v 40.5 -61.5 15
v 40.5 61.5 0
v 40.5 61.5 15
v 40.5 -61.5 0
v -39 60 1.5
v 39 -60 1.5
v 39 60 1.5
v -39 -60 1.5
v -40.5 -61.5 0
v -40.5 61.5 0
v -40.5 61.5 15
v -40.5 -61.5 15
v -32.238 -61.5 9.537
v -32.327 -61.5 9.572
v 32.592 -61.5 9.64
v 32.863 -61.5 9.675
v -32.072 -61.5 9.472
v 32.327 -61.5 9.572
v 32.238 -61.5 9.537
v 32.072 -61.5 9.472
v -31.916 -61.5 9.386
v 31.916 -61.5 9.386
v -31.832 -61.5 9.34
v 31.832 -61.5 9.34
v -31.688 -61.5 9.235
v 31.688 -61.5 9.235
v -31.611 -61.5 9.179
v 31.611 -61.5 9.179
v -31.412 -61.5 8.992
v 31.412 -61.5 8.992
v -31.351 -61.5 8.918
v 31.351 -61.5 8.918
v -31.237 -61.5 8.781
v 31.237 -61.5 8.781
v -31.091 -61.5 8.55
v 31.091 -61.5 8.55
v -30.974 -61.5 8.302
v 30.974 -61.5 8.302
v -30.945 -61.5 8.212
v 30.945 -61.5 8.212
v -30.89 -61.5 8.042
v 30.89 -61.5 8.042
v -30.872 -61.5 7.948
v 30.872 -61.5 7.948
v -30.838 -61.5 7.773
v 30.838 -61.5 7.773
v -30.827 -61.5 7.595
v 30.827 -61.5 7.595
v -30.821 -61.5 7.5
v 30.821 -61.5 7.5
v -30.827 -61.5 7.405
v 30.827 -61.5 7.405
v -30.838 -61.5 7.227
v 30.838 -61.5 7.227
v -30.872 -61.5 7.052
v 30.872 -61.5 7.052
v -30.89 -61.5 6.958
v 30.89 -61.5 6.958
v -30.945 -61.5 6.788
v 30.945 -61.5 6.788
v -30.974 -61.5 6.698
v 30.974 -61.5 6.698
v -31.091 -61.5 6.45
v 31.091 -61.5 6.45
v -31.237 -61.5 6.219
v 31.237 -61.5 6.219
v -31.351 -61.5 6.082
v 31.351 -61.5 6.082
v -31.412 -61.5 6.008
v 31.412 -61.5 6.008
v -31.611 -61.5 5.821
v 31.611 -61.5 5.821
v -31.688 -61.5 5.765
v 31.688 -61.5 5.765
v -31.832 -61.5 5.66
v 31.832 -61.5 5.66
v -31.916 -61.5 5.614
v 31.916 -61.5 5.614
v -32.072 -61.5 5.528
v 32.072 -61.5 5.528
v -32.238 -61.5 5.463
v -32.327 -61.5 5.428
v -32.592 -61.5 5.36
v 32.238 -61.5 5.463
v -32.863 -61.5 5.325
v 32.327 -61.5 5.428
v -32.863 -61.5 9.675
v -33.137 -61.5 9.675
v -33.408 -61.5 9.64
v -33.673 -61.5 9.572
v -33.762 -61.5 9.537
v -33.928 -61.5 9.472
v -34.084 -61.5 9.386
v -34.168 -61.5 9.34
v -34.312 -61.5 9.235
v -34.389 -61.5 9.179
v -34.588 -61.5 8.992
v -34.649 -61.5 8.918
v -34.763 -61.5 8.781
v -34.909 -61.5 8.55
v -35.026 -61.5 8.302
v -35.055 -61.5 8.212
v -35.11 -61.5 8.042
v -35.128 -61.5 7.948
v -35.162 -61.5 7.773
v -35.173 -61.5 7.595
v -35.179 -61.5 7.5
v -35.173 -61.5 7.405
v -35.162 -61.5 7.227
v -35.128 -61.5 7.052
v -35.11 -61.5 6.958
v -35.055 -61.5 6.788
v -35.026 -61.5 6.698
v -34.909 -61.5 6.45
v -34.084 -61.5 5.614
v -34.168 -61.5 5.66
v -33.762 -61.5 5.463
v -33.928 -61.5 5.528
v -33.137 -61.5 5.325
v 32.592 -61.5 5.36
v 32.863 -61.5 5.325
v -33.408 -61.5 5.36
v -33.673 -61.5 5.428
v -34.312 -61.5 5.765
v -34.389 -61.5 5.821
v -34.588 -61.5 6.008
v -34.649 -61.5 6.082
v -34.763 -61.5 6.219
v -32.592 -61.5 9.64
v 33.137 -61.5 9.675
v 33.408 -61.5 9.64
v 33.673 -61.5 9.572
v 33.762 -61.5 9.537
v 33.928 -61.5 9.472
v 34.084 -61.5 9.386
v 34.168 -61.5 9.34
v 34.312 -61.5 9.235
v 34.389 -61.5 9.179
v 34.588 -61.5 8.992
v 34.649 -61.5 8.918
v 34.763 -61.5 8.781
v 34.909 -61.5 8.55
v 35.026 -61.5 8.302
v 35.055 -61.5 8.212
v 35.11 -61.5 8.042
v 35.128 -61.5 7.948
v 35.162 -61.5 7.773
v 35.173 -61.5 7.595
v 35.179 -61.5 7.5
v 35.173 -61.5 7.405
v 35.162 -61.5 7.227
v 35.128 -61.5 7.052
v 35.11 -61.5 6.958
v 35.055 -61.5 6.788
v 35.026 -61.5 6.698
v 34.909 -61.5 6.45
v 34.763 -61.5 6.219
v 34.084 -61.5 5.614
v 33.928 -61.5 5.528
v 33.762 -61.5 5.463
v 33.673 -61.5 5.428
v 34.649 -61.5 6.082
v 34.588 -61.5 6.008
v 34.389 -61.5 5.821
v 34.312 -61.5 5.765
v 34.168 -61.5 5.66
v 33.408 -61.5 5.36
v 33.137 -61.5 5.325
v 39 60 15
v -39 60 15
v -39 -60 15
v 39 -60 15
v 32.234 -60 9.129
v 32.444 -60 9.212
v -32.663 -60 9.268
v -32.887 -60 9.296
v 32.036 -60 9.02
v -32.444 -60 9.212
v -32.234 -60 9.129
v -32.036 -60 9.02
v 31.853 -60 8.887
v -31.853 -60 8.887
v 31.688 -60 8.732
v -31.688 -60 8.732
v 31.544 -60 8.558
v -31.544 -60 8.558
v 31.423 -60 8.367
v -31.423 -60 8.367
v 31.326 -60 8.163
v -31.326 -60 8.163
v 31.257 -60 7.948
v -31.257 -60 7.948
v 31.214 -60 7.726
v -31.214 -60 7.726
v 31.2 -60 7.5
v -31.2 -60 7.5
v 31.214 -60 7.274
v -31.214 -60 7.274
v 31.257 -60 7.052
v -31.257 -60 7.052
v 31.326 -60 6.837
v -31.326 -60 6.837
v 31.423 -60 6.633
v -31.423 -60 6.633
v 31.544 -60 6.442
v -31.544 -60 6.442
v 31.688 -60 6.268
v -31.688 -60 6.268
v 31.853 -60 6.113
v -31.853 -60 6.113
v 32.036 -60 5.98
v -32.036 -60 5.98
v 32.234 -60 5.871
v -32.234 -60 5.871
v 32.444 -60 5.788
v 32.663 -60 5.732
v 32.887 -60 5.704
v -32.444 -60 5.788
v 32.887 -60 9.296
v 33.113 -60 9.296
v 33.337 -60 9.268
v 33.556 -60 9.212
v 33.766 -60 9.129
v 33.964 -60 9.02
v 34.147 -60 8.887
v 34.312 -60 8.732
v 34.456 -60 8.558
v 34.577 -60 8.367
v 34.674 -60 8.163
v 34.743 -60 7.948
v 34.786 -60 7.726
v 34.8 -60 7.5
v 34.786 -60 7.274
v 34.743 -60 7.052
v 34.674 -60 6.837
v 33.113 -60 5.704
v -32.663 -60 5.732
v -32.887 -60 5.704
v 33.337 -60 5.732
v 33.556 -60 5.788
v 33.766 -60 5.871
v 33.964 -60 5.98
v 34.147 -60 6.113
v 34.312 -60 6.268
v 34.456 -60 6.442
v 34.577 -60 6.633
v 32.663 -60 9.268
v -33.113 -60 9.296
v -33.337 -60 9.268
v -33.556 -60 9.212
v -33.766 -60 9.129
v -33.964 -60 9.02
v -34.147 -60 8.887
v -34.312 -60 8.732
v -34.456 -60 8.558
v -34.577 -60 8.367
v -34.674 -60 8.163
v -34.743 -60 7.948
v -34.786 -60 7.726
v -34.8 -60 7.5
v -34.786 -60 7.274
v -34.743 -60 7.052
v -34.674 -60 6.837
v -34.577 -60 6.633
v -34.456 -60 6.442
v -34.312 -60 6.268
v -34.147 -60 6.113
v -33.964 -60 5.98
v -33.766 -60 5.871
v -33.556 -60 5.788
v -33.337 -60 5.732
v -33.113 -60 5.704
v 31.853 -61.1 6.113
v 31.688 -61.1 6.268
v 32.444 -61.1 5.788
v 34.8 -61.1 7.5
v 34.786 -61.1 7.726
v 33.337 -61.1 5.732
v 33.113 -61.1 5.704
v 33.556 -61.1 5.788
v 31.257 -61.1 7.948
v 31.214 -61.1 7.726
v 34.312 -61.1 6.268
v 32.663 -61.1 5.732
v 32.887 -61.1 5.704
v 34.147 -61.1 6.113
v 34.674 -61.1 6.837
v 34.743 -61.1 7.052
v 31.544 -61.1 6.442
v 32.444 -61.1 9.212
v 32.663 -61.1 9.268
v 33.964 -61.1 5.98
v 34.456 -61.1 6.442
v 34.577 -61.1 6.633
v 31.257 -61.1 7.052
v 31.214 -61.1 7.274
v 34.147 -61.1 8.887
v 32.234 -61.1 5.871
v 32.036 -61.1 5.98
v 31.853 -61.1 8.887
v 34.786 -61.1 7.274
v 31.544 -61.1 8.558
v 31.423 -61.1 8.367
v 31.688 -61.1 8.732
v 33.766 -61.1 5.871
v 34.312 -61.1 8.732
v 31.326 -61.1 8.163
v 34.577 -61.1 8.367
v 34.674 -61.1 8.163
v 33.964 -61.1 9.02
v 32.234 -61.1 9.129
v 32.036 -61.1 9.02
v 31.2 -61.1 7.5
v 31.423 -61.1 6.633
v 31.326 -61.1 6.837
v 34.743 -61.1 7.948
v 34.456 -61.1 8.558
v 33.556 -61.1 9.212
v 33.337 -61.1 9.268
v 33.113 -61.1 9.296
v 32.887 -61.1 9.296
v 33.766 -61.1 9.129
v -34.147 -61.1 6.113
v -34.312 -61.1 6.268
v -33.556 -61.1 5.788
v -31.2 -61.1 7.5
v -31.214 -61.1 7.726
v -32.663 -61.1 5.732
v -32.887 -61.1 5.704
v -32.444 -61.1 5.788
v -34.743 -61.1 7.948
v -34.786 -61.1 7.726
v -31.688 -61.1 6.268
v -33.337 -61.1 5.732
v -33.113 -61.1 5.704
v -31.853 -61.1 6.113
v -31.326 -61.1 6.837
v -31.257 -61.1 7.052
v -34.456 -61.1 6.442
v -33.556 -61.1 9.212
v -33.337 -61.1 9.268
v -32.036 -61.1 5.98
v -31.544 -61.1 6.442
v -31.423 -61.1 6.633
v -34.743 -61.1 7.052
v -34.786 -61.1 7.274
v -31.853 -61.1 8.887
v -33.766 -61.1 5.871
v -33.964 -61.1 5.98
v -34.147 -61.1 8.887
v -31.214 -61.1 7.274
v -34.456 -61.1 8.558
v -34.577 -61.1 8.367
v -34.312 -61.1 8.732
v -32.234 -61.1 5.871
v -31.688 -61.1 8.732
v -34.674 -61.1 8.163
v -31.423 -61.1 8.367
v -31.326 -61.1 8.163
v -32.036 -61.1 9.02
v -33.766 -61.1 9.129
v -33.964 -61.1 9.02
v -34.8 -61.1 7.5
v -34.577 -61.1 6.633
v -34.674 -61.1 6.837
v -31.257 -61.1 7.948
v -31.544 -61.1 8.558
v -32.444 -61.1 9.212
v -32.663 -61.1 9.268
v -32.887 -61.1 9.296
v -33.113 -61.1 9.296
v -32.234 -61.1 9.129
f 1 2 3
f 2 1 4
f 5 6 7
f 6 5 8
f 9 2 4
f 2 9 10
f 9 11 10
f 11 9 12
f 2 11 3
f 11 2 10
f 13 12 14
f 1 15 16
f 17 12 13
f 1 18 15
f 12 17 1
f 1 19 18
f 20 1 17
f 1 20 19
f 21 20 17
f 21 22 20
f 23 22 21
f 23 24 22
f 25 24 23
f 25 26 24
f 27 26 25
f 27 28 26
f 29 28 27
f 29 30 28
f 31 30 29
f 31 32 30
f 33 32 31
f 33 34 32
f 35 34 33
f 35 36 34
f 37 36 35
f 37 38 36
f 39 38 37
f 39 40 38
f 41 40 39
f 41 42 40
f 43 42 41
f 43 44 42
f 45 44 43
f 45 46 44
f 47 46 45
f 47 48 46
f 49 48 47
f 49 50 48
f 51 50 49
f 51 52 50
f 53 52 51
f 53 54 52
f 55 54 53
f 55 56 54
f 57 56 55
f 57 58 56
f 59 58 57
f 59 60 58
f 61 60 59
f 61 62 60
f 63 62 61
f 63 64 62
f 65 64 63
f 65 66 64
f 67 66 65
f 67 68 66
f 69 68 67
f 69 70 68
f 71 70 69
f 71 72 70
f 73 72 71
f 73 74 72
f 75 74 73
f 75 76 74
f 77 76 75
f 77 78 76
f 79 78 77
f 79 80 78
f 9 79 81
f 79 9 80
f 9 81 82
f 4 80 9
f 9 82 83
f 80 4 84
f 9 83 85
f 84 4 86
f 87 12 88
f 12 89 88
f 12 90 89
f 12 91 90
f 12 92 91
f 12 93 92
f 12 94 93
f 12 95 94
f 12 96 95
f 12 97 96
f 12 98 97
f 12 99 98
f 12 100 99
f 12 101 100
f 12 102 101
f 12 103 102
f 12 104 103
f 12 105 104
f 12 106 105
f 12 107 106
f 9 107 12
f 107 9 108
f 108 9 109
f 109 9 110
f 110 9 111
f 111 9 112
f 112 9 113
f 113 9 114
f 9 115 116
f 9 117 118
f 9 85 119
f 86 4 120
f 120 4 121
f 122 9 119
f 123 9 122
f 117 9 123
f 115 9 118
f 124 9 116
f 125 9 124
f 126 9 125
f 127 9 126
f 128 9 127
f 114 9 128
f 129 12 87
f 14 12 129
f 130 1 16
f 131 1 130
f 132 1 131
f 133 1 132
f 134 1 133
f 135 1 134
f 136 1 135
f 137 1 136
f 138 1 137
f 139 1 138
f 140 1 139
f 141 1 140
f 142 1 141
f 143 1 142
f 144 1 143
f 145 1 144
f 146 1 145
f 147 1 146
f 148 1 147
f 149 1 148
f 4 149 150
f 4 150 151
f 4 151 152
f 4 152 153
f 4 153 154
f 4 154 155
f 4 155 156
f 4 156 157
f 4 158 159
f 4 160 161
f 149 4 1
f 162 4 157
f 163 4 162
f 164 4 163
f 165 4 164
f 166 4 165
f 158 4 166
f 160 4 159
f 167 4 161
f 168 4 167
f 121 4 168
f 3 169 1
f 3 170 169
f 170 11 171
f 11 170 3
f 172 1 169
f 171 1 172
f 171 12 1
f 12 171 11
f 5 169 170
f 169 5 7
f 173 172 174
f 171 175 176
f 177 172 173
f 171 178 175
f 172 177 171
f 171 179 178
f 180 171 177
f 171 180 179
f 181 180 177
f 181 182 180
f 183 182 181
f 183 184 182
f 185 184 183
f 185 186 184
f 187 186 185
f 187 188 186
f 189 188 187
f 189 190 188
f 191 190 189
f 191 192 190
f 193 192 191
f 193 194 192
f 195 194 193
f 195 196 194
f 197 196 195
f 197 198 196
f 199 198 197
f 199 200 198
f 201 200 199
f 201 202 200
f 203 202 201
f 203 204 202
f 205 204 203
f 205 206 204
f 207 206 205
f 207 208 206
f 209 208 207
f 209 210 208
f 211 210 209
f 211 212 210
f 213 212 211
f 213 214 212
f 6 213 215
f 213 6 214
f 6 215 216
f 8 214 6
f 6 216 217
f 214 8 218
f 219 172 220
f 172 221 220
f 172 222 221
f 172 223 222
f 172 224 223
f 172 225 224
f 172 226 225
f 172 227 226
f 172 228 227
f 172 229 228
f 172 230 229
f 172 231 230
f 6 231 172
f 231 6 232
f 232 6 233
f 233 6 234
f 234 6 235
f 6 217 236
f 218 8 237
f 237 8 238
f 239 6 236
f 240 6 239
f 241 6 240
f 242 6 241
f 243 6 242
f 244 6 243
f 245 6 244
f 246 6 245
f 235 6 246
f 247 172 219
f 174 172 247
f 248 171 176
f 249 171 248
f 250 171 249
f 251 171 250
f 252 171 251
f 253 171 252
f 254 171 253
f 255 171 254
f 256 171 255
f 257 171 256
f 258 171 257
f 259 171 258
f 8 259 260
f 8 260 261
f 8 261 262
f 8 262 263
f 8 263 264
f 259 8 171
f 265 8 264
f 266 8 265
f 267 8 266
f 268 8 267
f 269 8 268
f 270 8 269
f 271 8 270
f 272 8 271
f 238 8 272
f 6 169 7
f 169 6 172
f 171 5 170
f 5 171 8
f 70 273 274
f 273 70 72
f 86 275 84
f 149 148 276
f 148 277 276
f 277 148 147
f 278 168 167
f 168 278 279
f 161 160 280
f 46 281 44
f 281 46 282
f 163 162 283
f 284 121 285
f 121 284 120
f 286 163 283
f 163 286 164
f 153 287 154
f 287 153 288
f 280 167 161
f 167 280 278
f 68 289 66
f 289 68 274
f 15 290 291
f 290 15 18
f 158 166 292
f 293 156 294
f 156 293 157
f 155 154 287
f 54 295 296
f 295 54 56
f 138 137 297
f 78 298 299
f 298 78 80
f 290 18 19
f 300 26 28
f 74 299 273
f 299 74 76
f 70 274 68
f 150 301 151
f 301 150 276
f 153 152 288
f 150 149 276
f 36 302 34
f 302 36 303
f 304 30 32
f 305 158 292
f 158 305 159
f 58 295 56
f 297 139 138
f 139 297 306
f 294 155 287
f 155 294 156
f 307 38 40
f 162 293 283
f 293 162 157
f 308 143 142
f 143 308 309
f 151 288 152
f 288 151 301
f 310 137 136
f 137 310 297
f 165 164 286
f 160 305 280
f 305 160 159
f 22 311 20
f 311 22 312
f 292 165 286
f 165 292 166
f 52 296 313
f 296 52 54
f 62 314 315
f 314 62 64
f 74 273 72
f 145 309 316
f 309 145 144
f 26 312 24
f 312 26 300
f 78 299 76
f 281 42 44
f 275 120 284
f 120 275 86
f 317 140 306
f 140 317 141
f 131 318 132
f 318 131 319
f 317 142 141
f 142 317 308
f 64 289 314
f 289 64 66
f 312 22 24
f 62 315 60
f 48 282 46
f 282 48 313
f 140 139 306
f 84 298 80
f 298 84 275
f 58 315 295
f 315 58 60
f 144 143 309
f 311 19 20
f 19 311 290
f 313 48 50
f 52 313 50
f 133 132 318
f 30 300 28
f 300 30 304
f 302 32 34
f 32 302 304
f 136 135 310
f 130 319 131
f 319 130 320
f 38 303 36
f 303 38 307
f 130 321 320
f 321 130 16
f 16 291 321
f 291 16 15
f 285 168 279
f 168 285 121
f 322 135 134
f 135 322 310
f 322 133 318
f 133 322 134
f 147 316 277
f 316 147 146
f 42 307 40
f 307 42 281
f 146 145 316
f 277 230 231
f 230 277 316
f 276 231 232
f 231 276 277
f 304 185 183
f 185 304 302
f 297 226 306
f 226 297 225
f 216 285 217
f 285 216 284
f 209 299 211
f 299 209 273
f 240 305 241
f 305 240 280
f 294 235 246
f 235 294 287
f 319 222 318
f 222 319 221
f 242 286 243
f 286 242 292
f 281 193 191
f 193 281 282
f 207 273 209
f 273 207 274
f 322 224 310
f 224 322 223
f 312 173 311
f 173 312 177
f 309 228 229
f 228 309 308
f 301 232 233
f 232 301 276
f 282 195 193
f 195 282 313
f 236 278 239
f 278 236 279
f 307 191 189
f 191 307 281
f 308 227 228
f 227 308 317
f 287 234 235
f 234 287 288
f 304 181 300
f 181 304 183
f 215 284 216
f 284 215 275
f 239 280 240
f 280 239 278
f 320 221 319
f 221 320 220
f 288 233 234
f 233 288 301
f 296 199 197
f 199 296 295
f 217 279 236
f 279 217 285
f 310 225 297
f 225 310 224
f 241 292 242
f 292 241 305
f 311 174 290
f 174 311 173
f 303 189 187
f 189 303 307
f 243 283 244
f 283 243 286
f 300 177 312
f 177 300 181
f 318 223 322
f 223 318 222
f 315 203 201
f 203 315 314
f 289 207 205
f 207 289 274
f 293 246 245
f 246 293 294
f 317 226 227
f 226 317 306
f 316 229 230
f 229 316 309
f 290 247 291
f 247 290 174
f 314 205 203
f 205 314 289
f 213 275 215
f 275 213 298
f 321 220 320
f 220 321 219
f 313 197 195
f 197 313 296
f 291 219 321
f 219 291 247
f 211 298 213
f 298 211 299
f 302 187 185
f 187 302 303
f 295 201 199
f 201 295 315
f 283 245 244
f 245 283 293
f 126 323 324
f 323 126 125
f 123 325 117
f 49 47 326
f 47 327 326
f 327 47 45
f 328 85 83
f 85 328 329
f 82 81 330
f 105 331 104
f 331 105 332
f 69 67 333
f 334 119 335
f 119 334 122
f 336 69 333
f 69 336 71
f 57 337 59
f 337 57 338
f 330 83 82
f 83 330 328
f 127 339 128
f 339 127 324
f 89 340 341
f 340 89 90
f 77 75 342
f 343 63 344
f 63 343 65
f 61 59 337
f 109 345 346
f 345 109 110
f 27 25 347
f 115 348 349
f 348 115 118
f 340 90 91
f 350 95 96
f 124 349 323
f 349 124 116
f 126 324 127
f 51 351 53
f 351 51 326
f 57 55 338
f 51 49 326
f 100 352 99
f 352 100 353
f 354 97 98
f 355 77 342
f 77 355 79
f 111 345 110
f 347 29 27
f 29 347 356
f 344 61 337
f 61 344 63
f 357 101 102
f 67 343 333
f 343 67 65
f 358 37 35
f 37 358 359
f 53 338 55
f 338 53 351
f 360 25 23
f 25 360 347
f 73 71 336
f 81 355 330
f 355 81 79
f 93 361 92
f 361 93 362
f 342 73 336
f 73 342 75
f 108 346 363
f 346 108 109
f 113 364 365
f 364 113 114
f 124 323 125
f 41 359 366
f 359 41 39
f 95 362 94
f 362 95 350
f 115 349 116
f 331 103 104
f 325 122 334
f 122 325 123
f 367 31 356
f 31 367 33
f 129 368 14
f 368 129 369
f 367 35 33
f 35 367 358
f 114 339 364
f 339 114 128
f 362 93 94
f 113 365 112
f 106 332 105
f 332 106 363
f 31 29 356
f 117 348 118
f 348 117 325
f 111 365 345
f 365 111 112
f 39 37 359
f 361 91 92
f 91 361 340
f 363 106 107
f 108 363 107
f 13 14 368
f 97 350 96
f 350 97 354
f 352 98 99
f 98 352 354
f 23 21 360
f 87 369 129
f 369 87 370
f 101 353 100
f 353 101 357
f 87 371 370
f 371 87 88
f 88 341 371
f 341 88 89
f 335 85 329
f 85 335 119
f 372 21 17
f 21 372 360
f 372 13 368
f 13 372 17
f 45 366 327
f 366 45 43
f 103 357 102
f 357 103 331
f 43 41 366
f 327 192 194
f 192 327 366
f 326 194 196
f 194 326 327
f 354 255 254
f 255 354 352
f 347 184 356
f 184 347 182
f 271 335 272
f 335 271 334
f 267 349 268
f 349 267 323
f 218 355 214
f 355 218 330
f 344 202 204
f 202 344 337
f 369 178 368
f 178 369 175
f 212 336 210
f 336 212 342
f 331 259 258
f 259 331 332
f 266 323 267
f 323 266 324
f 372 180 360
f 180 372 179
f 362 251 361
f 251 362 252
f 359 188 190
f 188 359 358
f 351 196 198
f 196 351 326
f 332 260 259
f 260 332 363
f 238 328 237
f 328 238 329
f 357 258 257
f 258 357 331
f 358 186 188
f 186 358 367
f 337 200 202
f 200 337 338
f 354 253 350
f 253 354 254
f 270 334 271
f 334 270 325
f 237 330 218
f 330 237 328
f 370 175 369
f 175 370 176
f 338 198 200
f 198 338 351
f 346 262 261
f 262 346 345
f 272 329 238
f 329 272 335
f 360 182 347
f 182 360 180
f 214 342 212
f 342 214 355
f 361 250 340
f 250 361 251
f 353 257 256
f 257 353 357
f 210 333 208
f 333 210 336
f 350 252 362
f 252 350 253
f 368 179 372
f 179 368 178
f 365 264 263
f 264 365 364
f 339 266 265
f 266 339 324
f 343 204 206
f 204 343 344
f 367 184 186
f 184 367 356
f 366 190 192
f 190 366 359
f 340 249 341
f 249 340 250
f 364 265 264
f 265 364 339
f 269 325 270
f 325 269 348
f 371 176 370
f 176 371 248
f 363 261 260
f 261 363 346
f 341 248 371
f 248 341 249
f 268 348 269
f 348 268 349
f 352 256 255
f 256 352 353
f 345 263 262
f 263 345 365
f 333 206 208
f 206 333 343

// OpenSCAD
$fn = 50;


difference() {
	union() {
		translate(v = [-40.5000000000, -61.5000000000, 0]) {
			cube(size = [81, 123, 1.5000000000]);
		}
		translate(v = [-40.5000000000, 60.0000000000, 0]) {
			cube(size = [81, 1.5000000000, 15]);
		}
		translate(v = [-40.5000000000, -61.5000000000, 0]) {
			cube(size = [81, 1.5000000000, 15]);
		}
		translate(v = [39.0000000000, -61.5000000000, 0]) {
			cube(size = [1.5000000000, 123, 15]);
		}
		translate(v = [-40.5000000000, -61.5000000000, 0]) {
			cube(size = [1.5000000000, 123, 15]);
		}
	}
	union() {
		translate(v = [33.0000000000, -63.0000000000, 7.5000000000]) {
			rotate(a = [90, 0, 0]) {
				difference() {
					union() {
						#translate(v = [0, 0, -15.0000000000]) {
							cylinder(h = 15, r = 1.5000000000);
						}
						#translate(v = [0, 0, -1.9000000000]) {
							cylinder(h = 1.9000000000, r1 = 1.8000000000, r2 = 3.6000000000);
						}
						#translate(v = [0, 0, -15.0000000000]) {
							cylinder(h = 15, r = 1.8000000000);
						}
						#translate(v = [0, 0, -15.0000000000]) {
							cylinder(h = 15, r = 1.5000000000);
						}
					}
					union();
				}
			}
		}
		translate(v = [-33.0000000000, -63.0000000000, 7.5000000000]) {
			rotate(a = [90, 0, 0]) {
				difference() {
					union() {
						#translate(v = [0, 0, -15.0000000000]) {
							cylinder(h = 15, r = 1.5000000000);
						}
						#translate(v = [0, 0, -1.9000000000]) {
							cylinder(h = 1.9000000000, r1 = 1.8000000000, r2 = 3.6000000000);
						}
						#translate(v = [0, 0, -15.0000000000]) {
							cylinder(h = 15, r = 1.8000000000);
						}
						#translate(v = [0, 0, -15.0000000000]) {
							cylinder(h = 15, r = 1.5000000000);
						}
					}
					union();
				}
			}
		}
		translate(v = [33.0000000000, -63.0000000000, 7.5000000000]) {
			rotate(a = [90, 0, 0]) {
				difference() {
					union() {
						#translate(v = [0, 0, -15.0000000000]) {
							cylinder(h = 15, r = 1.5000000000);
						}
						#translate(v = [0, 0, -1.9000000000]) {
							cylinder(h = 1.9000000000, r1 = 1.8000000000, r2 = 3.6000000000);
						}
						#translate(v = [0, 0, -15.0000000000]) {
							cylinder(h = 15, r = 1.8000000000);
						}
						#translate(v = [0, 0, -15.0000000000]) {
							cylinder(h = 15, r = 1.5000000000);
						}
					}
					union();
				}
			}
		}
		translate(v = [-33.0000000000, -63.0000000000, 7.5000000000]) {
			rotate(a = [90, 0, 0]) {
				difference() {
					union() {
						#translate(v = [0, 0, -15.0000000000]) {
							cylinder(h = 15, r = 1.5000000000);
						}
						#translate(v = [0, 0, -1.9000000000]) {
							cylinder(h = 1.9000000000, r1 = 1.8000000000, r2 = 3.6000000000);
						}
						#translate(v = [0, 0, -15.0000000000]) {
							cylinder(h = 15, r = 1.8000000000);
						}
						#translate(v = [0, 0, -15.0000000000]) {
							cylinder(h = 15, r = 1.5000000000);
						}
					}
					union();
				}
			}
		}
	}
}
